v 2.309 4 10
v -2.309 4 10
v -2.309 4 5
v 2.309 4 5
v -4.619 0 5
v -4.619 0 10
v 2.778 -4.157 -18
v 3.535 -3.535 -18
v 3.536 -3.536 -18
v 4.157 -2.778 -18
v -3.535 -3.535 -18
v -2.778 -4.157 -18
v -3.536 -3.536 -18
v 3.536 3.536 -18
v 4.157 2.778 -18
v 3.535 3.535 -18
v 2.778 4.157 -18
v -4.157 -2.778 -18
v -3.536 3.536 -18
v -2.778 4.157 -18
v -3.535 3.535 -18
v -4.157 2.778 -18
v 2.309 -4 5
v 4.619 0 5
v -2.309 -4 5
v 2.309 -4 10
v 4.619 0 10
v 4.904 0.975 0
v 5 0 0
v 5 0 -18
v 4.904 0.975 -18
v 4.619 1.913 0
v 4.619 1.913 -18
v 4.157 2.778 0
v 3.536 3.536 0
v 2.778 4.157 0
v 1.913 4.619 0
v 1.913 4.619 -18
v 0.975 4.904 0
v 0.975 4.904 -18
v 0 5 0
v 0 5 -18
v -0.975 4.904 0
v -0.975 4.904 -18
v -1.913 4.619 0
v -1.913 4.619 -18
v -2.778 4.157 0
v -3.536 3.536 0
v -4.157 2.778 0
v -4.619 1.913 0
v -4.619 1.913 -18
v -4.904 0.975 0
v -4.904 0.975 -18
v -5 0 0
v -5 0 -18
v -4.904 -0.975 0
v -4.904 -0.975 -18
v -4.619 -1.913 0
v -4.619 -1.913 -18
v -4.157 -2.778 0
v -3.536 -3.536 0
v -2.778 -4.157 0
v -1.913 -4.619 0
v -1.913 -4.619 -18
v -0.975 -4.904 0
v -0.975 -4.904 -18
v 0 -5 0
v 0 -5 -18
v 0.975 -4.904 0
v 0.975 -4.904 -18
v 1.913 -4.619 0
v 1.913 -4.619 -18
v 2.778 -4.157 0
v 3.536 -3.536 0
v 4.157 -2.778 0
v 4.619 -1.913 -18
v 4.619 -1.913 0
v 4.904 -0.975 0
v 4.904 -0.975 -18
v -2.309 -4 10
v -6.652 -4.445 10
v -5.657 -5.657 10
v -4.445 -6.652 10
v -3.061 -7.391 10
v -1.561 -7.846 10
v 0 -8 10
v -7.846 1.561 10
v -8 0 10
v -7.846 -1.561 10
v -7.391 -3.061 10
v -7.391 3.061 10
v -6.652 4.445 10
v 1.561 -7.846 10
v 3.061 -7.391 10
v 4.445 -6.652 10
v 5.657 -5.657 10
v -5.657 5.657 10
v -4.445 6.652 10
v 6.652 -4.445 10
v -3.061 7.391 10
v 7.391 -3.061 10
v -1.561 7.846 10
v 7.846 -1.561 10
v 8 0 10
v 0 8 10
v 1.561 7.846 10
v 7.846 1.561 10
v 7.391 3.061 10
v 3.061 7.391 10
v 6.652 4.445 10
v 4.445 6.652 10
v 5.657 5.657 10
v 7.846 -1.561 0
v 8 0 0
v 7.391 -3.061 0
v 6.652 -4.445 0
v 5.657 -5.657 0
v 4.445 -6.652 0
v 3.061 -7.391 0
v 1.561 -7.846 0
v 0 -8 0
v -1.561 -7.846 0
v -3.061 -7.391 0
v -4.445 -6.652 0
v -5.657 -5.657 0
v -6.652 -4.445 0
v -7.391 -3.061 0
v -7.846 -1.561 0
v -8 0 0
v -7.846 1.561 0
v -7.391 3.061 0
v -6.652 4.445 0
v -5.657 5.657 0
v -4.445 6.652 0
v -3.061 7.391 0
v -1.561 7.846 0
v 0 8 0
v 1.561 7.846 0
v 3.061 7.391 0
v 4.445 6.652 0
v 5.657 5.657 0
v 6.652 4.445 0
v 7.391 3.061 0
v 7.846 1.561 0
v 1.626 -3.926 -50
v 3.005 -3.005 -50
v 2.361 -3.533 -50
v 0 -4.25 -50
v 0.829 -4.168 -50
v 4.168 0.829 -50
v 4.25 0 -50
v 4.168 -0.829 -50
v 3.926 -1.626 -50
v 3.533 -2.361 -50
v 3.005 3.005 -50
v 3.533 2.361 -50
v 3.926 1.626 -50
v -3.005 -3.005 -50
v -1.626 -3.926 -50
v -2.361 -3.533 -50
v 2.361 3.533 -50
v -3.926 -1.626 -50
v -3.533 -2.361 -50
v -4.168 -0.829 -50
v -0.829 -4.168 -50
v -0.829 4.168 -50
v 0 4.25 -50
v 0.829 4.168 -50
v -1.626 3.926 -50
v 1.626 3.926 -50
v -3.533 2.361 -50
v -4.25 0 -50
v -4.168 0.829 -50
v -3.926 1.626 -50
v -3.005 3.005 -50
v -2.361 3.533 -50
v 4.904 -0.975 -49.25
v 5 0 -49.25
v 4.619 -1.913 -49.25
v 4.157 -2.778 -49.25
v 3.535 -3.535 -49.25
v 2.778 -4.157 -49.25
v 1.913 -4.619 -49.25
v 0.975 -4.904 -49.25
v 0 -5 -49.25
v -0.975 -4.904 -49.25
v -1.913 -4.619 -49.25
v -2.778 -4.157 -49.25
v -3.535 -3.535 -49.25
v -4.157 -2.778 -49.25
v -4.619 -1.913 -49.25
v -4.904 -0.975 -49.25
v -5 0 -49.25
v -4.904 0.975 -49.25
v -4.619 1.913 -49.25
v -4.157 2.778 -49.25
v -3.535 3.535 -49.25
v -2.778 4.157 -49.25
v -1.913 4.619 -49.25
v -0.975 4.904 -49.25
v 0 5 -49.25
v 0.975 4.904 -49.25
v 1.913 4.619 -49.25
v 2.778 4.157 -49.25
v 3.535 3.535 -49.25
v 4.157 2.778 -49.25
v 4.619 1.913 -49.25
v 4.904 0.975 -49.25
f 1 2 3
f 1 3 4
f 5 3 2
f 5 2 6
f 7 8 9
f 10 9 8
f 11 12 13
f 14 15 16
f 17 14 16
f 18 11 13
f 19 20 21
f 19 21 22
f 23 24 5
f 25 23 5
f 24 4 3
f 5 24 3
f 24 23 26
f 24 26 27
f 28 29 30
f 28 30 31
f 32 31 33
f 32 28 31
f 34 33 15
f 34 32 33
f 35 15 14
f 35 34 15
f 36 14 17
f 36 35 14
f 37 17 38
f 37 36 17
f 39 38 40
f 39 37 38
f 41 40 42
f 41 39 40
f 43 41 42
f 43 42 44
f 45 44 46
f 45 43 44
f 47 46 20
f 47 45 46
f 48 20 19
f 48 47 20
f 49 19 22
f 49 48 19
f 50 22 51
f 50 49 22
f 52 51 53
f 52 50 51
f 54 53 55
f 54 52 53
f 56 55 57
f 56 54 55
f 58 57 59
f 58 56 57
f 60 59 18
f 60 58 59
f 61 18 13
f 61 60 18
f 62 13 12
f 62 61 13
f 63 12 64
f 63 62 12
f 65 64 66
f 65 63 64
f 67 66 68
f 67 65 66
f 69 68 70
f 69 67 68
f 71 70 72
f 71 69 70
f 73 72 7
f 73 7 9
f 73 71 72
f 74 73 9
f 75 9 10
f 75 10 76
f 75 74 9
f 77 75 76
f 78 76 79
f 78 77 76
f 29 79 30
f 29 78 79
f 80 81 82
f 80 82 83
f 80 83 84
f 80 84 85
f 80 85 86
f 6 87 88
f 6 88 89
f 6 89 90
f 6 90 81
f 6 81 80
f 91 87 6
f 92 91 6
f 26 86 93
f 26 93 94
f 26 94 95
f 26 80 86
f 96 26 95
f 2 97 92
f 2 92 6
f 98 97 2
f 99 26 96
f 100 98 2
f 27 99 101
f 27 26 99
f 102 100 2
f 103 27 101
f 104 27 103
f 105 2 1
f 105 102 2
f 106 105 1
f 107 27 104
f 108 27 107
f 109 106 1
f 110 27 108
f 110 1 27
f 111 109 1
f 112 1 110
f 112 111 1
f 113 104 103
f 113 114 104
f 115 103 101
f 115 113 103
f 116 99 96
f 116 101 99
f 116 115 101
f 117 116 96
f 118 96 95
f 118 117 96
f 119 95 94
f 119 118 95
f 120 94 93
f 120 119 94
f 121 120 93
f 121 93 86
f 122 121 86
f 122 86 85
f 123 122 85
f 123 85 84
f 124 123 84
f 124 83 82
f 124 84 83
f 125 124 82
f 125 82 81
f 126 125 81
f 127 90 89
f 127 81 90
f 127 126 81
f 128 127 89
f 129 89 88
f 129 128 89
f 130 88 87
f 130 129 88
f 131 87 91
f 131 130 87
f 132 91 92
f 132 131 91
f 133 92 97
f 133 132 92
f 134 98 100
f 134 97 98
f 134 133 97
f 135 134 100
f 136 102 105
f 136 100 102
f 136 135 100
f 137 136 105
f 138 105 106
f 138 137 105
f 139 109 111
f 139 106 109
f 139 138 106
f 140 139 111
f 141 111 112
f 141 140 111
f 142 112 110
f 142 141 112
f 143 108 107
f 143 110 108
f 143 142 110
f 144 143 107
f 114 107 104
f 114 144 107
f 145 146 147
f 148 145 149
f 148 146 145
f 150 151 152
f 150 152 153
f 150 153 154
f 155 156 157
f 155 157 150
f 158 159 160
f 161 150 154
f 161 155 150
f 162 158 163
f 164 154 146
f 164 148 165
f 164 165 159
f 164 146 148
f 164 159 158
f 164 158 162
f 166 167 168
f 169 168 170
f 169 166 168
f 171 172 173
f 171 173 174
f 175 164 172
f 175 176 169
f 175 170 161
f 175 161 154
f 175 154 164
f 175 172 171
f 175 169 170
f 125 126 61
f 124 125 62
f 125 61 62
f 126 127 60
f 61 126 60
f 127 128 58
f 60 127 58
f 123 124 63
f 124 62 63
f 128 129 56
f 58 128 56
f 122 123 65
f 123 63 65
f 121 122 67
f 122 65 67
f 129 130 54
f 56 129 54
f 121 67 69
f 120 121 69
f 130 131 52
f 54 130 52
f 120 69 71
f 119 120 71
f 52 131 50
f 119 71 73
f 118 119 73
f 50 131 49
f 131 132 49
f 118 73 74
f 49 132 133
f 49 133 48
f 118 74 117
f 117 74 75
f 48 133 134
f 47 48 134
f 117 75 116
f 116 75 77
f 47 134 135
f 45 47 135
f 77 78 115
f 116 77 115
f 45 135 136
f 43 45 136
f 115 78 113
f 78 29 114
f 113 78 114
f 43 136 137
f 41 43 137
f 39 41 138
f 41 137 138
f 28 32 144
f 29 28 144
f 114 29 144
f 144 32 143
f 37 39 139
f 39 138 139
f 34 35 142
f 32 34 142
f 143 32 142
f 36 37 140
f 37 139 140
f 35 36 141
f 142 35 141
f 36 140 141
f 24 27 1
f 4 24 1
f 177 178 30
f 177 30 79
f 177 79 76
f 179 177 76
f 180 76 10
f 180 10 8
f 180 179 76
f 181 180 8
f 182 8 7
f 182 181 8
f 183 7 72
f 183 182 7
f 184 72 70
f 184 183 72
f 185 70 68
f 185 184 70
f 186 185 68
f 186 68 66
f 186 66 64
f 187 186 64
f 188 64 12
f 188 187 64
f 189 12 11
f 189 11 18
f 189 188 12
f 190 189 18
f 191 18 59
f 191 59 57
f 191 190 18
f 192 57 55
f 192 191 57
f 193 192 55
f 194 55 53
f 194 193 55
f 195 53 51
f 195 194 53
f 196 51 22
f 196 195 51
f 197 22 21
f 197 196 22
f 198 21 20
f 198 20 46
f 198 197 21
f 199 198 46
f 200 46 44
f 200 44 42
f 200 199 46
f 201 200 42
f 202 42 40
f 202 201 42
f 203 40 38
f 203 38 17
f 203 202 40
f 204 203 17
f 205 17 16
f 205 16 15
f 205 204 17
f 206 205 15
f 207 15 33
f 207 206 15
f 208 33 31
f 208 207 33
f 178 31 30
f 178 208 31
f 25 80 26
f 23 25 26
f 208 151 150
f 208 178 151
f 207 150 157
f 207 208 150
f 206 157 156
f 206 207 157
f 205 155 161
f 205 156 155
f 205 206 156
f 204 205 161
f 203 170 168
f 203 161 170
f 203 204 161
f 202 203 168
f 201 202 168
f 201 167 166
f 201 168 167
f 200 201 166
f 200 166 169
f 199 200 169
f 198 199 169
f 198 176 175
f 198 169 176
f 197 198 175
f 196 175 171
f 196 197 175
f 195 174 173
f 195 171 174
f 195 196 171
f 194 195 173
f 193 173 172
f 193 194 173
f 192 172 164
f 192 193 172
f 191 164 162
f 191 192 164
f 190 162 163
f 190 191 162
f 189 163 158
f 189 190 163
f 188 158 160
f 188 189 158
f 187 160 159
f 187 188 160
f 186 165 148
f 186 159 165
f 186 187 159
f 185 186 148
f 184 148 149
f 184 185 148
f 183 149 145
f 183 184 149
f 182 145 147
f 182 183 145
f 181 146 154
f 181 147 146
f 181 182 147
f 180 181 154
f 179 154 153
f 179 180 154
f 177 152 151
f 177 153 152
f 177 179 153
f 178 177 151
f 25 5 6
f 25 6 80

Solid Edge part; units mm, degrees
sketch "Sketch1" plane through (0, 0, 0) normal (0, 0, 1) x (1, 0, 0)
  circle A0 centre (0, 0) radius 8
  dimension "D1" = 16
extrude "Protrusion1" add sketch "Sketch1" along normal blind 10
sketch "Sketch2" plane through (0, 0, 0) normal (0, 0, -1) x (1, 0, 0)
  circle A0 centre (0, 0) radius 5
extrude "Protrusion2" add sketch "Sketch2" along normal blind 50
sketch "Sketch3" plane through (0, 0, -50) normal (0, 0, -1) x (1, 0, 0)
  circle A0 centre (0, 0) radius 4.9997
extrude "Cutout1" cut sketch "Sketch3" against normal blind 32 flip side to cut
chamfer "Chamfer_1" distance 0.75 angle 45 1 edges at (-4.9997, 0, -50)
sketch "Sketch4" plane through (0, 0, 10) normal (0, 0, 1) x (1, 0, 0)
  line L0 (-2.3094, 4) -> (2.3094, 4)
  line L1 (4.6188, 0) -> (2.3094, 4)
  line L2 (2.3094, -4) -> (4.6188, 0)
  line L3 (-2.3094, -4) -> (2.3094, -4)
  line L4 (-4.6188, 0) -> (-2.3094, -4)
  line L5 (-2.3094, 4) -> (-4.6188, 0)
  dimension "D1" = 8
extrude "Cutout2" cut sketch "Sketch4" against normal blind 5
properties part number "119167" material "Stainless Steel, 304"
